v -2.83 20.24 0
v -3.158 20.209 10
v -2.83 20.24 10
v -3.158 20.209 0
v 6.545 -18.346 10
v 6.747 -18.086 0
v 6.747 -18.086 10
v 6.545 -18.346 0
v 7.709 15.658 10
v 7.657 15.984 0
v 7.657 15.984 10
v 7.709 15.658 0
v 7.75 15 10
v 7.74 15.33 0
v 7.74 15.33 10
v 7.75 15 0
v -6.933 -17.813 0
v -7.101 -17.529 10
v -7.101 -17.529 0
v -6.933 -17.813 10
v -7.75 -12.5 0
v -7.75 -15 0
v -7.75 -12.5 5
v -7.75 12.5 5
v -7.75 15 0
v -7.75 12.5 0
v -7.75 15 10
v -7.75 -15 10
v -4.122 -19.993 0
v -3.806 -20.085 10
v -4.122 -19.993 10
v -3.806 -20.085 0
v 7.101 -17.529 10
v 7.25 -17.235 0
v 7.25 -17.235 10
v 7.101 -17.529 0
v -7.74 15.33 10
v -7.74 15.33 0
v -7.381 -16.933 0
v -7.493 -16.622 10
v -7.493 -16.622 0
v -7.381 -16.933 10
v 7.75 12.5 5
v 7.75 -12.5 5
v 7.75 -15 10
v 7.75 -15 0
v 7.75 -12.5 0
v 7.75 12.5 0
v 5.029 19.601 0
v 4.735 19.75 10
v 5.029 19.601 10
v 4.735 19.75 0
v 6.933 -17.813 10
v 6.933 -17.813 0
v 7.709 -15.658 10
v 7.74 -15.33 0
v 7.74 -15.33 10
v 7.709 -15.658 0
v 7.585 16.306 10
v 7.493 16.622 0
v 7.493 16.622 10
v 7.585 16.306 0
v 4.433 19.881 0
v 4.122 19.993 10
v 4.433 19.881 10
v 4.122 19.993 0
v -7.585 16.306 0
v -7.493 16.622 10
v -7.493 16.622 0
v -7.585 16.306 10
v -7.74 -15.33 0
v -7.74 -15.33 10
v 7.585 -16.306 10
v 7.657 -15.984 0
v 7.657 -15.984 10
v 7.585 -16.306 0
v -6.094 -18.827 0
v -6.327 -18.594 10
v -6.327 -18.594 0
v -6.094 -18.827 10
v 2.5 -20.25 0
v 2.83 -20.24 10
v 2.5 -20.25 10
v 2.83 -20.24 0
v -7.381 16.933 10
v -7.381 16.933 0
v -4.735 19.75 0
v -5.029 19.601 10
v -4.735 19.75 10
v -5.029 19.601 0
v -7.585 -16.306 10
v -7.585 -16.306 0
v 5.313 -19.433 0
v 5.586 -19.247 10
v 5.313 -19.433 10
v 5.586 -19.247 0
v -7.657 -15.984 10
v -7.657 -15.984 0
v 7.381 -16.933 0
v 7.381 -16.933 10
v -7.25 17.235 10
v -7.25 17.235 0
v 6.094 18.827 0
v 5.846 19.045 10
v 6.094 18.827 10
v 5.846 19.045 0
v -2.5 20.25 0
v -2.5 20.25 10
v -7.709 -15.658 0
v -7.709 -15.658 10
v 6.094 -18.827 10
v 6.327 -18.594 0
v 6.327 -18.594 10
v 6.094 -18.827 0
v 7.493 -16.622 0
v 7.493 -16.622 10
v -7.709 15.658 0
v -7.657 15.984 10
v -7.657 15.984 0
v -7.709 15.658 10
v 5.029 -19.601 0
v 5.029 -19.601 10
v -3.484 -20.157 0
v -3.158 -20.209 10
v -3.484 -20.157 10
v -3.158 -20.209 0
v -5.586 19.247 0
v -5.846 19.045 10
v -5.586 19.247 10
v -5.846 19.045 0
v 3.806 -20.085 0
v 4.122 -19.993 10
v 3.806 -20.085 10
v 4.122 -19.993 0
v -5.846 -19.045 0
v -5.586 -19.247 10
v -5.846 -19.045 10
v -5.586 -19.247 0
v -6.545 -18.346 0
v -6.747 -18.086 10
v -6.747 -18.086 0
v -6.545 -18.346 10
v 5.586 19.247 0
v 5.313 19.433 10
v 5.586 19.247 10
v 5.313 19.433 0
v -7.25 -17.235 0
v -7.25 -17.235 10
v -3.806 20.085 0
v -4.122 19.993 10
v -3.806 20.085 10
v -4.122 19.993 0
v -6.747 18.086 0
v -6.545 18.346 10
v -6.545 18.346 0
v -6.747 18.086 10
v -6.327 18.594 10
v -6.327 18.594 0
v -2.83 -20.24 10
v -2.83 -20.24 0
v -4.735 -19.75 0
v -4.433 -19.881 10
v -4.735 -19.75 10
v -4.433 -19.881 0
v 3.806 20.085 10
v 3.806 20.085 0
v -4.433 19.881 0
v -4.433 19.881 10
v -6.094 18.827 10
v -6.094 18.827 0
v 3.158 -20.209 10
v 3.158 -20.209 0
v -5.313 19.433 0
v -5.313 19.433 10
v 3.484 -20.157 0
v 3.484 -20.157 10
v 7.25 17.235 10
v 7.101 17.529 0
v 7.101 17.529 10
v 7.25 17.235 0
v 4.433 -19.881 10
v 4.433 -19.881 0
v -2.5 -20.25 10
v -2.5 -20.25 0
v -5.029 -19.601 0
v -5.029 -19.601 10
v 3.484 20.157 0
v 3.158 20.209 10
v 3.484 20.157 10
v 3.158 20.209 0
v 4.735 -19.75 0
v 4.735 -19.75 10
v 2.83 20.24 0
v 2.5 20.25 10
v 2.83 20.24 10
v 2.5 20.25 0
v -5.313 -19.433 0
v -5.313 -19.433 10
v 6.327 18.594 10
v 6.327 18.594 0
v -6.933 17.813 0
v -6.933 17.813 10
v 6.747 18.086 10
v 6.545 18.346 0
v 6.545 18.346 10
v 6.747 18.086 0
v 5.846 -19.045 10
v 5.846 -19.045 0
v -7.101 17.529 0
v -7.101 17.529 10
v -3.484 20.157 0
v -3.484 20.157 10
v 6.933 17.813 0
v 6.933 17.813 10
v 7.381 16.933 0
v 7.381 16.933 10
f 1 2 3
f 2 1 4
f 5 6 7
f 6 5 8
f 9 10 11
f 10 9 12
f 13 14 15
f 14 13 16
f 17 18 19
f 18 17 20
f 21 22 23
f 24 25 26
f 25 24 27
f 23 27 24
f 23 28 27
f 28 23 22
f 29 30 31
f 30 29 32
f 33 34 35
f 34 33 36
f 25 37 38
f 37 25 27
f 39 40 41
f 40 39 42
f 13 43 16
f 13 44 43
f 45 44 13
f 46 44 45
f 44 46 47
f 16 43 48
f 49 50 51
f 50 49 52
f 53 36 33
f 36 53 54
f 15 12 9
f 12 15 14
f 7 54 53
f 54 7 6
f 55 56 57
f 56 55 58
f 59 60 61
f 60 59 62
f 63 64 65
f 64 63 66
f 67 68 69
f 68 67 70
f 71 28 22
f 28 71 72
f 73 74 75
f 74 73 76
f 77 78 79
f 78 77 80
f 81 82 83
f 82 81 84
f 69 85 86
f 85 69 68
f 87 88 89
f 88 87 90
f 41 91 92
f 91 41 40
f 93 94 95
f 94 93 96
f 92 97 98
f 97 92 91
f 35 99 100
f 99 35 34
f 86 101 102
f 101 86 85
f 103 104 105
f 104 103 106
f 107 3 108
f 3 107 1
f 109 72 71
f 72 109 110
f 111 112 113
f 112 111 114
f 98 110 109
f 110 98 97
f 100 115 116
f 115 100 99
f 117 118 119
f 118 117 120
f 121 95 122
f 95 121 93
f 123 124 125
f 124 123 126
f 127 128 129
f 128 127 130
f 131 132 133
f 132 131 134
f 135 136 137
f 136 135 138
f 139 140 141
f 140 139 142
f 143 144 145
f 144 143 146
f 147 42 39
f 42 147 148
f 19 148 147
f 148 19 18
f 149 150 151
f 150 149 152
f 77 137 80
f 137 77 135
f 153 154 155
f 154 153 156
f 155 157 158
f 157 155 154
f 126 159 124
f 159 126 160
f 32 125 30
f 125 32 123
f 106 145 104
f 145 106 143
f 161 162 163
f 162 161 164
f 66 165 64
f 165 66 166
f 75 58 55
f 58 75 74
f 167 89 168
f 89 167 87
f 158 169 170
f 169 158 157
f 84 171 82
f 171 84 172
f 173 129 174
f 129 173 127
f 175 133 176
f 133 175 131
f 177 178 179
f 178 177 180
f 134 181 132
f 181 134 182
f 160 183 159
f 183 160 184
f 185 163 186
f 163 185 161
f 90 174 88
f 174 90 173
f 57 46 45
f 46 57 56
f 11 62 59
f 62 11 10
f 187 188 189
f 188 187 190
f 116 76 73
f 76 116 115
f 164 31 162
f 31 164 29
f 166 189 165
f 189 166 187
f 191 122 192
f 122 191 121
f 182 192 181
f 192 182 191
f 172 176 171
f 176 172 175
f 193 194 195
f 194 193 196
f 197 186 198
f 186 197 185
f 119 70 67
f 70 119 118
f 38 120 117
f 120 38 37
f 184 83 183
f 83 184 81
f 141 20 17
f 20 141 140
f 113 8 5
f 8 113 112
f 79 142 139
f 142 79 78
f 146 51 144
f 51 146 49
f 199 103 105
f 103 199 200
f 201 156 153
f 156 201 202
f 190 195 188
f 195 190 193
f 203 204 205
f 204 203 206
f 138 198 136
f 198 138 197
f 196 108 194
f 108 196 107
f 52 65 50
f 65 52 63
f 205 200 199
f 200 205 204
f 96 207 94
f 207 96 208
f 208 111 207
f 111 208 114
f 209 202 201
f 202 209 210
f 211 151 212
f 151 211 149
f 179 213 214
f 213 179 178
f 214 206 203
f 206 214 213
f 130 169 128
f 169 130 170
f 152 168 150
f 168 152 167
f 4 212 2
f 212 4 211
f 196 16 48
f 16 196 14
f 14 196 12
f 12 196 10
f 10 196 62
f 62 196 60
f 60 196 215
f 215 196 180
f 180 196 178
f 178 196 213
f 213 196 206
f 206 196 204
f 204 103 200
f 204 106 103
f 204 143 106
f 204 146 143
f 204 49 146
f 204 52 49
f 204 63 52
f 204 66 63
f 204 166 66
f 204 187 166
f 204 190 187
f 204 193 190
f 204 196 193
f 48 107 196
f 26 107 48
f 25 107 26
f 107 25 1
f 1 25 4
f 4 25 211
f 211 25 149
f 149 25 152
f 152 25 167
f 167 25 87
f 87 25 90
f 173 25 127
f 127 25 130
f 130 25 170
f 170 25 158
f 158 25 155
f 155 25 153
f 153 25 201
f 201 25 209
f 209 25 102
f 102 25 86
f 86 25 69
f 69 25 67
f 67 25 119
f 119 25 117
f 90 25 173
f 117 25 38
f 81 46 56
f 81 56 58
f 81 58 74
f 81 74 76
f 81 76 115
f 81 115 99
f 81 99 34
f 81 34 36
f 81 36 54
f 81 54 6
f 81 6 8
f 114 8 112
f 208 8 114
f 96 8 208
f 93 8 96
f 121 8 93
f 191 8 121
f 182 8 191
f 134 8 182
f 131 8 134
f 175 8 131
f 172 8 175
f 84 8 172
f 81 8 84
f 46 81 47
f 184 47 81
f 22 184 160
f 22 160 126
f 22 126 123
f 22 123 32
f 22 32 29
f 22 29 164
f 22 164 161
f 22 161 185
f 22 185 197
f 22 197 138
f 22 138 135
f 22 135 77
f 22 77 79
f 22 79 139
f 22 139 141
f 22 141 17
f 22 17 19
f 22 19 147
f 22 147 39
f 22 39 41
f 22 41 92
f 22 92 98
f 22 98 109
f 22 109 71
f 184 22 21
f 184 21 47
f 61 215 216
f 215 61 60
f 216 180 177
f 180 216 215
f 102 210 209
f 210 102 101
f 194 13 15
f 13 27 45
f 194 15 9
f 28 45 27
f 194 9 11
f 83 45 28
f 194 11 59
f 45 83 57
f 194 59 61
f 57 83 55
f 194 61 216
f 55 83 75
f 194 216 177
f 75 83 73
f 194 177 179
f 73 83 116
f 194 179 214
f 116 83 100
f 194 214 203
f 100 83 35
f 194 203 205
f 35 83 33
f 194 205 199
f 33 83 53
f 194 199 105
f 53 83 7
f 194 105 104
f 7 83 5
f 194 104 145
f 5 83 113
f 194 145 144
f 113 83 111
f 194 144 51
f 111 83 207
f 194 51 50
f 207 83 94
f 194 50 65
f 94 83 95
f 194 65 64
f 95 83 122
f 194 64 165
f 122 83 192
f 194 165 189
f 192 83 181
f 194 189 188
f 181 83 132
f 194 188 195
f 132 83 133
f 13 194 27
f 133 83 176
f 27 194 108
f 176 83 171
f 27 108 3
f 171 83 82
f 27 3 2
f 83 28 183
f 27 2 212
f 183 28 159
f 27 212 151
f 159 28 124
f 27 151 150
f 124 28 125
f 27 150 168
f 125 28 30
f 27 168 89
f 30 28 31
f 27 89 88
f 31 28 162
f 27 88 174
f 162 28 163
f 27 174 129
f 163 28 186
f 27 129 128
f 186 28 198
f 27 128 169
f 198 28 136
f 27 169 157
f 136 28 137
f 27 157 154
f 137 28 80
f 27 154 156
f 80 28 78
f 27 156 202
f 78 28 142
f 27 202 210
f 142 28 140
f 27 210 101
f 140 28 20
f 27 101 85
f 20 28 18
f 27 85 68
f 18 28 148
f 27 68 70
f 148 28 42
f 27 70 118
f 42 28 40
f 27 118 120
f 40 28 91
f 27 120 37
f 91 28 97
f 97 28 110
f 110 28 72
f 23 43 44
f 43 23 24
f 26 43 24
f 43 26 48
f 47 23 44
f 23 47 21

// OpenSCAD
// file: params.scad
//  ----------------------------------------------------------------------- LICENSE
//  This "brumm-case" by Andreas Streichardt is licensed
//  under the Creative Commons Attribution-ShareAlike 3.0 Unported License.
//  To view a copy of this license, visit
//  http://creativecommons.org/licenses/by-sa/3.0/
//  or send a letter to Creative Commons, PO Box 1866, Mountain View, CA 94042, USA.
//
//  Originally (and still heavily) based on work by Zygmunt Wojcik
//  https://github.com/zygmuntw/3D-Printed-Case-for-Arduino
//
//------------------------------------------------------------------------- SHARED PARAMETERS
$fn=100; // resolution

circleD = 21; // round corner circle diameter
roundR = circleD/2; // round corner circle radius
triangleH = (sqrt(3)*(circleD))/2; // triangle height to calculate other variables

layerHeight = 0.25; // some variariables are multiple of layer height and width
layerWidth = 0.5;

screwExt = 3.4; // screw through hole diameter
verConnectionHoleR = 1.2; // screw thread hole radius
screwHead = 6; // screw head hole diameter

gap = layerHeight/2;

floorHeight = 1.8; // 6*0.25 layer + 0.3 first layer

height = 30; // case height
innerHeight = height - floorHeight*2;

pillarSize = roundR-0.01; // corner pillar size

// dimensions of minkowski's inner square
// these are NOT case dimensions
// to calculate external case dimesions add 2 * roundR
// 55.3 + (2*10.5) = 76.3
width = 160.0;
wide = 80;

blockLockSize = 2; // middle connection lock size

// side cutting panels size
sidePanelXWidth = wide;
sidePanelYWidth = width;

// screw hole position from centre of the corner round circle
screwHoleRoundR = roundR - layerWidth*4 - (triangleH/2 - layerWidth*4)/2;

// prints dimensions of the case
echo("width", width + roundR*2); // total width
echo("wide", wide + roundR*2); // total wide

pcbHeight=1.64;
pcbHeightOffset = 2.5;
pcbGap = 4;

canPcbLength=28.0;
canPcbWidth=43.0;
canPcbPositionX = (width/2 + roundR - layerWidth*7 - gap*4) - pcbGap - canPcbLength;
canPcbPositionY = -3/4*canPcbWidth;
canPcbHoles=[ [2.5, 2.5, 0], 				
              [2.5, canPcbWidth - 2.5, 0],
          		[canPcbLength - 2.5, 2.5, 0],
          		[canPcbLength - 2.5, canPcbWidth - 2.5, 0] ];

// UNO PCB dimensions
megaPcbLength=102.0;
megaPcbWidth=53.3;
megaPcbPositionX = canPcbPositionX - megaPcbLength - pcbGap;
megaPcbPositionY = -(wide/2 + roundR - layerWidth*7 - gap*4) + 2;

megaPcbHoles=[  [13.97, 2.54, 0], 				
                [15.24, 50.8, 0],
          		[66.04, 35.56, 0],
          		[66.04, 7.62, 0],
                [96.5, 2.54, 0],
                [90.0, 50.8, 0]
             ];



usbPcbLength=63.0;
usbPcbWidth=30.0;
usbHeight = 21.0; // including some offset for the usb cable
usbPcbPositionX = -usbPcbLength/2;
usbPcbPositionY = megaPcbPositionY + megaPcbWidth + pcbGap;
usbPcbHoles=[  [14.0, usbPcbWidth - 3.8, 0], 				
                [56.1, usbPcbWidth - 2.8, 0],
          		[28.5, 4.8, 0]
             ];
             
convPcbLength=30;
convPcbWidth=50.5;
convHeight=23.0;
convPcbPositionX=megaPcbPositionX - pcbGap - convPcbLength;
convPcbPositionY=megaPcbPositionY + megaPcbWidth - 17;
convPcbHoles=[  [4.5, 4.5, 0], 				
                [4.5, 40.0, 0],
          		[24.7, 4.5, 0],
                [24.7, 40.0, 0]
             ];
             
nubsiPositions =[
                    [width/2+roundR-35,-wide/2-roundR+30,0],
                    [width/2+roundR-35-72,-wide/2-roundR+30-8,0],
                    [width/2+roundR-35-72,-wide/2-roundR+30-8+44,0]
                ];
// main file
//  ----------------------------------------------------------------------- LICENSE
//  This "brumm-case" by Andreas Streichardt is licensed
//  under the Creative Commons Attribution-ShareAlike 3.0 Unported License.
//  To view a copy of this license, visit
//  http://creativecommons.org/licenses/by-sa/3.0/
//  or send a letter to Creative Commons, PO Box 1866, Mountain View, CA 94042, USA.
//
//  Originally (and still heavily) based on work by Zygmunt Wojcik
//  https://github.com/zygmuntw/3D-Printed-Case-for-Arduino
//

include <params.scad>

// halterung oben
difference()
{
    linear_extrude(height = 10, convexity = 10)
    minkowski()
    {									
        square([5, 30], center = true);
        circle(roundR/2);
    }
    //translate([0,0,-3])
    cube([40, 25, 10], center=true);
}
